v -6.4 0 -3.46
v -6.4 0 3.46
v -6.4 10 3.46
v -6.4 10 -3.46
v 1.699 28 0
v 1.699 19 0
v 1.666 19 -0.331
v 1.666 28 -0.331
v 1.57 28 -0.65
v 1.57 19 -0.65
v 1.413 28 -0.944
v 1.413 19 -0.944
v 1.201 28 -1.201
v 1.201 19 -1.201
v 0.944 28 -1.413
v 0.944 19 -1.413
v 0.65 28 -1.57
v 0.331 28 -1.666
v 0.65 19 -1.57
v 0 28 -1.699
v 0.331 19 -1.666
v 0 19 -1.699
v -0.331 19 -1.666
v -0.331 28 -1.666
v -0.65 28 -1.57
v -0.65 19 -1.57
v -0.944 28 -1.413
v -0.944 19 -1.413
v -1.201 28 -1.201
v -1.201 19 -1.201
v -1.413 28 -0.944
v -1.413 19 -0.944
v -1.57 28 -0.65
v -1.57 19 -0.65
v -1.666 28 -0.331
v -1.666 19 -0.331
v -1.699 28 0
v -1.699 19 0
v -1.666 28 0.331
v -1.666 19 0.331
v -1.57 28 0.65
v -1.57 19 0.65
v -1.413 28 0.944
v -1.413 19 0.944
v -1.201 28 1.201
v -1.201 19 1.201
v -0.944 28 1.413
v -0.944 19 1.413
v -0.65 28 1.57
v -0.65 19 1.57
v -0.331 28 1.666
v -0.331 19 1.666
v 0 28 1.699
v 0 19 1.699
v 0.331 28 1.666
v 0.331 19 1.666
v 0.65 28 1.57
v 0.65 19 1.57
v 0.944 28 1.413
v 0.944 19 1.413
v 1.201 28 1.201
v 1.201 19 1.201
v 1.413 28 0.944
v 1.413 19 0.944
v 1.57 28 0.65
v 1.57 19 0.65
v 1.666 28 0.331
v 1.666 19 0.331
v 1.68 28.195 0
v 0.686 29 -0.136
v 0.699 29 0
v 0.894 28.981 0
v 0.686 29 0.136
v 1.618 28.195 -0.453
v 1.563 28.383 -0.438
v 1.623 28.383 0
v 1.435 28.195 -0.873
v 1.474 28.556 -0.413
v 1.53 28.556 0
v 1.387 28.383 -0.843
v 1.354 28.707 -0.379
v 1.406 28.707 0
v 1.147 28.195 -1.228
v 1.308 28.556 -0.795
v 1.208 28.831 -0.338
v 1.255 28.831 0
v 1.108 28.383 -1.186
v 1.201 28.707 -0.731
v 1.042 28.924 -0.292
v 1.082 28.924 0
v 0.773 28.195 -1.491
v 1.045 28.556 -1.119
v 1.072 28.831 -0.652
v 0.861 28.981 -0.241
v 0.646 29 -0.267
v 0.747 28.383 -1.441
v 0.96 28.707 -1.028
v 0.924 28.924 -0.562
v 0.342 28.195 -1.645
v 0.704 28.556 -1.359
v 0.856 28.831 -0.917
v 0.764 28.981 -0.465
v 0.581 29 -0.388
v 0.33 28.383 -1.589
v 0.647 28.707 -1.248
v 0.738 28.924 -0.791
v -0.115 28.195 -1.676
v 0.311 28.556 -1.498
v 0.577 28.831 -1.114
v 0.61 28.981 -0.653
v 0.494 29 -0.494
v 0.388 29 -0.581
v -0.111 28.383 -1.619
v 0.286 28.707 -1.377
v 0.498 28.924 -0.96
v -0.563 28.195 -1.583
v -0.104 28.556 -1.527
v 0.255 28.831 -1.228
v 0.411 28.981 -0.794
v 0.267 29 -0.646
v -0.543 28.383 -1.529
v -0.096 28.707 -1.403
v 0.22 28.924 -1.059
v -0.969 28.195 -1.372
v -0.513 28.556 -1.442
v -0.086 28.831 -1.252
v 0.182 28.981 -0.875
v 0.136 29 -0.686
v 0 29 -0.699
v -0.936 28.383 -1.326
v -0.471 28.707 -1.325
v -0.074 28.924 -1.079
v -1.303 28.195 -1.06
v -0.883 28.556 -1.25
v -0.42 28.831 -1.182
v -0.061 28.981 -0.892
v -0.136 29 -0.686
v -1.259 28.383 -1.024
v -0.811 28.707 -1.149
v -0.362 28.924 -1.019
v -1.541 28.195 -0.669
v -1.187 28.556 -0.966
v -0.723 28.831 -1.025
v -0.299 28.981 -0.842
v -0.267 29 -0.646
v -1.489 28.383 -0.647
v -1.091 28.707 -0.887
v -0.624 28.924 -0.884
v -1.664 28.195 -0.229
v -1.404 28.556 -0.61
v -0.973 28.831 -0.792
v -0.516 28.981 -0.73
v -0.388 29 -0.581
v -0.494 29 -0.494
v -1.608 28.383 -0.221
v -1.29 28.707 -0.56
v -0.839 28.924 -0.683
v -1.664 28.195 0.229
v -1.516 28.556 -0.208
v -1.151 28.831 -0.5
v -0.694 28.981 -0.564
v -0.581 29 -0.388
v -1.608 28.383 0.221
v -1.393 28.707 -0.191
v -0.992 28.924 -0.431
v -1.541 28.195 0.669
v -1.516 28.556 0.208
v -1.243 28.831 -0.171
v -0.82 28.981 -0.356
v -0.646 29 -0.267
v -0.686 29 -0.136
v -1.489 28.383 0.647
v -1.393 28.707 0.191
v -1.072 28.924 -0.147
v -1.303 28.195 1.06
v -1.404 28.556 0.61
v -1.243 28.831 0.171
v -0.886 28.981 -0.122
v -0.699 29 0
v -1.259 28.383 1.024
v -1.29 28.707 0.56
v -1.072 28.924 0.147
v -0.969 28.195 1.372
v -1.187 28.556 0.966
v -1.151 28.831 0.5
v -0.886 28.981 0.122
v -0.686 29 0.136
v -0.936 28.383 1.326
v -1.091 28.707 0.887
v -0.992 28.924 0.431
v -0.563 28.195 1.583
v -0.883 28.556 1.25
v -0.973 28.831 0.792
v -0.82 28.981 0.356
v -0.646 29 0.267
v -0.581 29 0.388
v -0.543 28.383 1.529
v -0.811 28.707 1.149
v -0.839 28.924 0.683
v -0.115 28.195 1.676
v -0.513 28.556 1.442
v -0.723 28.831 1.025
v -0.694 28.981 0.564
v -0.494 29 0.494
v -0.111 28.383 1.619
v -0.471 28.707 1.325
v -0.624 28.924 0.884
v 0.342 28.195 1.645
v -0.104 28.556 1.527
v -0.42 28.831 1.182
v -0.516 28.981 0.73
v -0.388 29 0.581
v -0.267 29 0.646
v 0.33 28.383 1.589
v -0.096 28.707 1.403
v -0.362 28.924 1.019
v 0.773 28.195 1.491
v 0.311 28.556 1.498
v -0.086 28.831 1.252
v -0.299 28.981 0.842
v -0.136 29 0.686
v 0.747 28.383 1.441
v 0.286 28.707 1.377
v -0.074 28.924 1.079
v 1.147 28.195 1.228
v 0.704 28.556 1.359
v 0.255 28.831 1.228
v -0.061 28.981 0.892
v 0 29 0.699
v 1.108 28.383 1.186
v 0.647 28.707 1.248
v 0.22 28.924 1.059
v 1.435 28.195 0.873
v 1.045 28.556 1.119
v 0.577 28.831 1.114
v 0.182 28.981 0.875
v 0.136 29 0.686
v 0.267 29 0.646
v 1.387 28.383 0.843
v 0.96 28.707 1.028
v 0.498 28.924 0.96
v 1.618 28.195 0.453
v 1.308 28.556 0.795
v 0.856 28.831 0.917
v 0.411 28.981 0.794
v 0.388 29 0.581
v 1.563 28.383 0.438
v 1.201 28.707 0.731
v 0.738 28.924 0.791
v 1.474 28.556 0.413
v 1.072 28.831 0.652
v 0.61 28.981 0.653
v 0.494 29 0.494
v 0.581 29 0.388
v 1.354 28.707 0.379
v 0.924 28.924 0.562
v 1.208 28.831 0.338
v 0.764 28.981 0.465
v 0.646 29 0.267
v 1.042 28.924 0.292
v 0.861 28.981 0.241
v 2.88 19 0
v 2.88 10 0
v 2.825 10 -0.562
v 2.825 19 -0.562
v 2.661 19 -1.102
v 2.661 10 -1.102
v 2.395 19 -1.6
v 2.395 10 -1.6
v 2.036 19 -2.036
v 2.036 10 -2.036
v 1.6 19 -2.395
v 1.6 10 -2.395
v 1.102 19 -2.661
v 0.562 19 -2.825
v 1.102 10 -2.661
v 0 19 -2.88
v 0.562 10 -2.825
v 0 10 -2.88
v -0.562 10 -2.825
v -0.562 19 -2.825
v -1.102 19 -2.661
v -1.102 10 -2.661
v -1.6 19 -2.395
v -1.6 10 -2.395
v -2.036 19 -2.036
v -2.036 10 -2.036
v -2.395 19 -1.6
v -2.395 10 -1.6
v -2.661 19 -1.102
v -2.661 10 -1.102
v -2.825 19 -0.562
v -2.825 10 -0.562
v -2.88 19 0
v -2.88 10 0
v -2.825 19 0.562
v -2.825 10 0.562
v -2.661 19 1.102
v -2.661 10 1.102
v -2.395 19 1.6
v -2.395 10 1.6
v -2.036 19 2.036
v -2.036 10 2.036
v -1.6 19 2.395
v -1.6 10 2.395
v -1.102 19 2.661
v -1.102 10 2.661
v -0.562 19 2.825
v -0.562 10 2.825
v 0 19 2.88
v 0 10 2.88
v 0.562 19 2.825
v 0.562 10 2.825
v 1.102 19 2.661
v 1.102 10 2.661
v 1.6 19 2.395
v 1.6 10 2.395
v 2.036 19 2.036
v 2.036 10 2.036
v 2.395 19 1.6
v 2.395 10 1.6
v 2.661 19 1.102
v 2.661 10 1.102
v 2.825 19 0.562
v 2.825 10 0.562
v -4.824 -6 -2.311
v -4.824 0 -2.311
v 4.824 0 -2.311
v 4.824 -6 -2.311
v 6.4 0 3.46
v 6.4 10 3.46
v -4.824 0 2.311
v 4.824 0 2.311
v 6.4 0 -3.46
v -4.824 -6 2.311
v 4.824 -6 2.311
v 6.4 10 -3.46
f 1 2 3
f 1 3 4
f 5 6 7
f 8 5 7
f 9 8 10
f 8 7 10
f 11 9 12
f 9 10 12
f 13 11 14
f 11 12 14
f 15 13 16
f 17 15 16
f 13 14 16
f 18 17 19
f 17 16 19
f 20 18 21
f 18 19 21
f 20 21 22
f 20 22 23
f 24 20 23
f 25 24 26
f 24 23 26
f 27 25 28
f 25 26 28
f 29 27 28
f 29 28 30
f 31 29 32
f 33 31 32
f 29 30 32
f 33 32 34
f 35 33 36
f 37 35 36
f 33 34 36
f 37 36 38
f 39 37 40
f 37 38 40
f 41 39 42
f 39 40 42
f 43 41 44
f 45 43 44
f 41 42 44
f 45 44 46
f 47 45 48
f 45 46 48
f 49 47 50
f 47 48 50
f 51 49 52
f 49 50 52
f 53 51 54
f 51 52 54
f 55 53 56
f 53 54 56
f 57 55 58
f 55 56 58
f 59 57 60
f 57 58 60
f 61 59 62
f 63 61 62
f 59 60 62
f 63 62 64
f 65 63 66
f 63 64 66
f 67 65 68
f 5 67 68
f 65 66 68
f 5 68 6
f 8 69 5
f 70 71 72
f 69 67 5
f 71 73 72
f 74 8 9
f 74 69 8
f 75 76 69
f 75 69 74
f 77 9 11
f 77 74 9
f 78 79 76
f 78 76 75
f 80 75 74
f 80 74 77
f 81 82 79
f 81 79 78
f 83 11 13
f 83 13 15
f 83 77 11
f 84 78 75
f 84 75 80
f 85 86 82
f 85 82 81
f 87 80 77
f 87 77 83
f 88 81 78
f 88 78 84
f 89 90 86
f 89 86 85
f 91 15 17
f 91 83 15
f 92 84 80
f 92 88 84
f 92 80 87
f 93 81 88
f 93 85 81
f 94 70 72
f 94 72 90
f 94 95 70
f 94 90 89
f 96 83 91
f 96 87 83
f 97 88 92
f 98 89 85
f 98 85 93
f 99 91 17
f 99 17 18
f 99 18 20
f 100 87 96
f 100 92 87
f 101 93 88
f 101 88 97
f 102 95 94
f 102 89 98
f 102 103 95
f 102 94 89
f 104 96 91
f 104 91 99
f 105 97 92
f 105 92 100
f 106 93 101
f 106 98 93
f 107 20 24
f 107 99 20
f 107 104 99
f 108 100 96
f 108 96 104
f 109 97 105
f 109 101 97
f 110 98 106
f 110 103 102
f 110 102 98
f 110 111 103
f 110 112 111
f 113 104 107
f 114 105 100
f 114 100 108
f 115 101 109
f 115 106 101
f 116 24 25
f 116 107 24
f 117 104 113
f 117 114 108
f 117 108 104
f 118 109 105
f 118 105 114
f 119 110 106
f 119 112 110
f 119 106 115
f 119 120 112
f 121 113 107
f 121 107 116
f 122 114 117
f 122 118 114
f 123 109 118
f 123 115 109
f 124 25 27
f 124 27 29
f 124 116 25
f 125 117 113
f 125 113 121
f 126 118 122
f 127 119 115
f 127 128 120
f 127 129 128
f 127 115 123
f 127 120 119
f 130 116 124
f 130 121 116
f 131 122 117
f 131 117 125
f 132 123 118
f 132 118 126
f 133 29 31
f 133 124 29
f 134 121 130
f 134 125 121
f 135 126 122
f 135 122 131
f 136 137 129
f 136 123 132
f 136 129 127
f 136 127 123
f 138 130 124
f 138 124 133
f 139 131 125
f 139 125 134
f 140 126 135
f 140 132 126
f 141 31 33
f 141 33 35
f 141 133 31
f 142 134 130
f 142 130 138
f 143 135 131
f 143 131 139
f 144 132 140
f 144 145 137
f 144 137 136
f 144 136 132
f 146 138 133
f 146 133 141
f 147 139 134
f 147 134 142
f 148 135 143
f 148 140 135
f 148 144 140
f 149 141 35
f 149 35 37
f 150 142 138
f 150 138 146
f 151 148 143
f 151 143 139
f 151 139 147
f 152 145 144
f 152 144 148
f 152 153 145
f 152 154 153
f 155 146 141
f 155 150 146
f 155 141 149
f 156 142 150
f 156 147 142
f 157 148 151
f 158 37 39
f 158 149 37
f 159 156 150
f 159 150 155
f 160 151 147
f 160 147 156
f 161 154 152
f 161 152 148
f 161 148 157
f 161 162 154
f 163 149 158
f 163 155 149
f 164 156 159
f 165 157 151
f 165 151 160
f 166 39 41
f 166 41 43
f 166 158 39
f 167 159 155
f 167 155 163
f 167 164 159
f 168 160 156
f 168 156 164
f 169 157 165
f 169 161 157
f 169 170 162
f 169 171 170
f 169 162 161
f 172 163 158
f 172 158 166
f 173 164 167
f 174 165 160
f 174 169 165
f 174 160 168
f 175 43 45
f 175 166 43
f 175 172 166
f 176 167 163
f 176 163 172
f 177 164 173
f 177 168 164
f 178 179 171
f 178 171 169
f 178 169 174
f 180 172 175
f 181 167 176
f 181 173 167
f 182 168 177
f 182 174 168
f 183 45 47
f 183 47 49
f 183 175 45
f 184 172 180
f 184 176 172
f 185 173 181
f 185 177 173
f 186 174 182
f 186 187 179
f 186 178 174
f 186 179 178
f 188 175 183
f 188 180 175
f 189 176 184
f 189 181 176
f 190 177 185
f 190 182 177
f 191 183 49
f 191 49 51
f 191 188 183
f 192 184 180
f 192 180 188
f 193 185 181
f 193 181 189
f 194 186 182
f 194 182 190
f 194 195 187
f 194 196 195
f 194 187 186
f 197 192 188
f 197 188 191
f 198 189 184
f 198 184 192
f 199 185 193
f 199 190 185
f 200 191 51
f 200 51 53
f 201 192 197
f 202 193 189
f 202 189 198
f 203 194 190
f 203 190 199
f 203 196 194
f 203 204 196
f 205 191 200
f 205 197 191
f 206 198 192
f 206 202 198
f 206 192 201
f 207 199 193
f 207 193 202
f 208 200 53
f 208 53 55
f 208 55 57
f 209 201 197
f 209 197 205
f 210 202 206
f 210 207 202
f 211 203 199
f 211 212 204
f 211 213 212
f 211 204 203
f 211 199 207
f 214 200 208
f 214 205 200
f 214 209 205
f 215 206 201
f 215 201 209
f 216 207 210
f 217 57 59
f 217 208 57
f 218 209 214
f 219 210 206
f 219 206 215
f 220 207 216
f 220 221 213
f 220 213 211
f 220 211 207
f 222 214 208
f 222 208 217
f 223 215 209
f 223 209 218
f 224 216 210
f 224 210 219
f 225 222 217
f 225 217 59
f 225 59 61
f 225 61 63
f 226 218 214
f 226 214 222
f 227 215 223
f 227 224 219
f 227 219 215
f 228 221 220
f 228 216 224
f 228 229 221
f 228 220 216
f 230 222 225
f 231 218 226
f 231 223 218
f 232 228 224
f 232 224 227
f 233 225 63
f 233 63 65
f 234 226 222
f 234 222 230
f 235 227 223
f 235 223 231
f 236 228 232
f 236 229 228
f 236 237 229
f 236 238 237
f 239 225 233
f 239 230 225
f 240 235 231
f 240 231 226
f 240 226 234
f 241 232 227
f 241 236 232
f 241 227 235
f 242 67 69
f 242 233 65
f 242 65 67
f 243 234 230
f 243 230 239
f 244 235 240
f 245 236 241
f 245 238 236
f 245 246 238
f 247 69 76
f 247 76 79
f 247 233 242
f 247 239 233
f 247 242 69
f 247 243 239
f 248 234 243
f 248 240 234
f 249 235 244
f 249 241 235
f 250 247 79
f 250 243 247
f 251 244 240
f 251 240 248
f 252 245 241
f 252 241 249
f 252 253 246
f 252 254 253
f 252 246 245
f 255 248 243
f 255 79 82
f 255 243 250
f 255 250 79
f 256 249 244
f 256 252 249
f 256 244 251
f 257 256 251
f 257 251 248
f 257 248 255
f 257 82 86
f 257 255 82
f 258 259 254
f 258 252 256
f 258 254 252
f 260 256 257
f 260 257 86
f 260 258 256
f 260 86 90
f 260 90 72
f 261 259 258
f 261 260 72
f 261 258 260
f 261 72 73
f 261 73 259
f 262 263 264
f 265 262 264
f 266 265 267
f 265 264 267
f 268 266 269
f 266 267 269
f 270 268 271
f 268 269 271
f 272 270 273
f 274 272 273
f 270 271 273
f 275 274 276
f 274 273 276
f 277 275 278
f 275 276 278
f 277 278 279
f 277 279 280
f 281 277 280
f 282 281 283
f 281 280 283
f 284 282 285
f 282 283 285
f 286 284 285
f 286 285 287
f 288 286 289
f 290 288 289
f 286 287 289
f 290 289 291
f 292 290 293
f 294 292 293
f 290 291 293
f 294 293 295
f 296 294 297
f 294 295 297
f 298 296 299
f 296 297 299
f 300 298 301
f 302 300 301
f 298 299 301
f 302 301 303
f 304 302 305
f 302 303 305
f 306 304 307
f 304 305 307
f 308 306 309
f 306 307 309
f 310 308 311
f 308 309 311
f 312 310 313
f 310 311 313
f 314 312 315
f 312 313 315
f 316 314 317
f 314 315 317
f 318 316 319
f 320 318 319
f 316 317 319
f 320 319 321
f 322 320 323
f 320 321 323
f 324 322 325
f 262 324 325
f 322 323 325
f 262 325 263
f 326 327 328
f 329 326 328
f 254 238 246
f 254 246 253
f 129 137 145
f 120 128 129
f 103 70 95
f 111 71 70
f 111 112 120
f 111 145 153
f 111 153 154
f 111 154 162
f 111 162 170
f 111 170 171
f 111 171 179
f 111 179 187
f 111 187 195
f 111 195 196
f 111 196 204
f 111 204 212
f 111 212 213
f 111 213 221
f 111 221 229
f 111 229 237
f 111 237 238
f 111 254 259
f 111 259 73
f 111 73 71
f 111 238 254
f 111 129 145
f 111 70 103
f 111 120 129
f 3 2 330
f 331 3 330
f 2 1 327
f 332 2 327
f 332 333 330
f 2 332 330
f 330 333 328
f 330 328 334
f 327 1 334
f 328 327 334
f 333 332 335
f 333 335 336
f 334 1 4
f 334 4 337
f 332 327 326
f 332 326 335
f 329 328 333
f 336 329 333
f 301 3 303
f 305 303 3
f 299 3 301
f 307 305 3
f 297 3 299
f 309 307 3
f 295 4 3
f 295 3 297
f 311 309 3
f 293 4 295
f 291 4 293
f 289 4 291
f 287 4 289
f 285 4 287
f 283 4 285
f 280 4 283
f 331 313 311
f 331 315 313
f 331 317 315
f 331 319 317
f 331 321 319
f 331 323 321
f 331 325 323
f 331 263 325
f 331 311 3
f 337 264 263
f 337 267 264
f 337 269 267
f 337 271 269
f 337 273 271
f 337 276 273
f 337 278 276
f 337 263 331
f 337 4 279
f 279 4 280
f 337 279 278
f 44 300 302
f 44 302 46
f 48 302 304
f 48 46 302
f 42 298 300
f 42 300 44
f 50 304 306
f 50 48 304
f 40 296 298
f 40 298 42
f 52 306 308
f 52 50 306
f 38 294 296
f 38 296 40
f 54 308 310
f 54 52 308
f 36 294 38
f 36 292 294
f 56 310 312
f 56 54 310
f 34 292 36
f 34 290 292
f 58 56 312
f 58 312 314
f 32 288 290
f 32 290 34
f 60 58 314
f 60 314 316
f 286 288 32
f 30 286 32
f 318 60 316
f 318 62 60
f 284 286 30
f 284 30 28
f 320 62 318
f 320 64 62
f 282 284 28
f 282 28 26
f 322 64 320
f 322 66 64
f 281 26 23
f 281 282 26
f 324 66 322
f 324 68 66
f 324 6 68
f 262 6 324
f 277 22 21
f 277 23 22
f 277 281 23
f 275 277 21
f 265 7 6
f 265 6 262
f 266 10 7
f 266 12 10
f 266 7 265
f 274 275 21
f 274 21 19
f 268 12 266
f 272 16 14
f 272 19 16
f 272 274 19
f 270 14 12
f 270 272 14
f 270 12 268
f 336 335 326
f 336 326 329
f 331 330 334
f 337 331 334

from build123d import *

# Parameters (mm, degrees)
SKETCH1_W           = 12.8
SKETCH1_H           = 6.92
BOSS_EXTRUDE1_DEPTH = 10
SKETCH2_R           = 2.88
BOSS_EXTRUDE2_DEPTH = 9
SKETCH3_R           = 1.699009251
BOSS_EXTRUDE3_DEPTH = 10
FILLET1_R           = 1
SKETCH4_W           = 9.648664286
SKETCH4_H           = 4.621814488
BOSS_EXTRUDE4_DEPTH = 6


with BuildPart() as part:
    # Sketch1 → Boss-Extrude1 (new body)
    with BuildSketch(Plane(origin=(0, 0, 0), x_dir=(1, 0, 0), z_dir=(0, 1, 0))):
        Rectangle(SKETCH1_W, SKETCH1_H)
    extrude(amount=BOSS_EXTRUDE1_DEPTH)

    # Sketch2 → Boss-Extrude2 (add)
    with BuildSketch(Plane(origin=(0, 10, 0), x_dir=(1, 0, 0), z_dir=(0, 1, 0))):
        Circle(SKETCH2_R)
    extrude(amount=BOSS_EXTRUDE2_DEPTH)

    # Sketch3 → Boss-Extrude3 (add)
    with BuildSketch(Plane(origin=(0, 19, 0), x_dir=(1, 0, 0), z_dir=(0, 1, 0))):
        Circle(SKETCH3_R)
    extrude(amount=BOSS_EXTRUDE3_DEPTH)

    # Fillet1
    fillet1_edges = [part.edges().sort_by_distance(p)[0] for p in [
        (-1.699009251, 29, 0),
    ]]
    fillet(fillet1_edges, radius=FILLET1_R)

    # Sketch4 → Boss-Extrude4 (add)
    with BuildSketch(Plane.XZ):
        Rectangle(SKETCH4_W, SKETCH4_H)
    extrude(amount=BOSS_EXTRUDE4_DEPTH)


solid = part.part
